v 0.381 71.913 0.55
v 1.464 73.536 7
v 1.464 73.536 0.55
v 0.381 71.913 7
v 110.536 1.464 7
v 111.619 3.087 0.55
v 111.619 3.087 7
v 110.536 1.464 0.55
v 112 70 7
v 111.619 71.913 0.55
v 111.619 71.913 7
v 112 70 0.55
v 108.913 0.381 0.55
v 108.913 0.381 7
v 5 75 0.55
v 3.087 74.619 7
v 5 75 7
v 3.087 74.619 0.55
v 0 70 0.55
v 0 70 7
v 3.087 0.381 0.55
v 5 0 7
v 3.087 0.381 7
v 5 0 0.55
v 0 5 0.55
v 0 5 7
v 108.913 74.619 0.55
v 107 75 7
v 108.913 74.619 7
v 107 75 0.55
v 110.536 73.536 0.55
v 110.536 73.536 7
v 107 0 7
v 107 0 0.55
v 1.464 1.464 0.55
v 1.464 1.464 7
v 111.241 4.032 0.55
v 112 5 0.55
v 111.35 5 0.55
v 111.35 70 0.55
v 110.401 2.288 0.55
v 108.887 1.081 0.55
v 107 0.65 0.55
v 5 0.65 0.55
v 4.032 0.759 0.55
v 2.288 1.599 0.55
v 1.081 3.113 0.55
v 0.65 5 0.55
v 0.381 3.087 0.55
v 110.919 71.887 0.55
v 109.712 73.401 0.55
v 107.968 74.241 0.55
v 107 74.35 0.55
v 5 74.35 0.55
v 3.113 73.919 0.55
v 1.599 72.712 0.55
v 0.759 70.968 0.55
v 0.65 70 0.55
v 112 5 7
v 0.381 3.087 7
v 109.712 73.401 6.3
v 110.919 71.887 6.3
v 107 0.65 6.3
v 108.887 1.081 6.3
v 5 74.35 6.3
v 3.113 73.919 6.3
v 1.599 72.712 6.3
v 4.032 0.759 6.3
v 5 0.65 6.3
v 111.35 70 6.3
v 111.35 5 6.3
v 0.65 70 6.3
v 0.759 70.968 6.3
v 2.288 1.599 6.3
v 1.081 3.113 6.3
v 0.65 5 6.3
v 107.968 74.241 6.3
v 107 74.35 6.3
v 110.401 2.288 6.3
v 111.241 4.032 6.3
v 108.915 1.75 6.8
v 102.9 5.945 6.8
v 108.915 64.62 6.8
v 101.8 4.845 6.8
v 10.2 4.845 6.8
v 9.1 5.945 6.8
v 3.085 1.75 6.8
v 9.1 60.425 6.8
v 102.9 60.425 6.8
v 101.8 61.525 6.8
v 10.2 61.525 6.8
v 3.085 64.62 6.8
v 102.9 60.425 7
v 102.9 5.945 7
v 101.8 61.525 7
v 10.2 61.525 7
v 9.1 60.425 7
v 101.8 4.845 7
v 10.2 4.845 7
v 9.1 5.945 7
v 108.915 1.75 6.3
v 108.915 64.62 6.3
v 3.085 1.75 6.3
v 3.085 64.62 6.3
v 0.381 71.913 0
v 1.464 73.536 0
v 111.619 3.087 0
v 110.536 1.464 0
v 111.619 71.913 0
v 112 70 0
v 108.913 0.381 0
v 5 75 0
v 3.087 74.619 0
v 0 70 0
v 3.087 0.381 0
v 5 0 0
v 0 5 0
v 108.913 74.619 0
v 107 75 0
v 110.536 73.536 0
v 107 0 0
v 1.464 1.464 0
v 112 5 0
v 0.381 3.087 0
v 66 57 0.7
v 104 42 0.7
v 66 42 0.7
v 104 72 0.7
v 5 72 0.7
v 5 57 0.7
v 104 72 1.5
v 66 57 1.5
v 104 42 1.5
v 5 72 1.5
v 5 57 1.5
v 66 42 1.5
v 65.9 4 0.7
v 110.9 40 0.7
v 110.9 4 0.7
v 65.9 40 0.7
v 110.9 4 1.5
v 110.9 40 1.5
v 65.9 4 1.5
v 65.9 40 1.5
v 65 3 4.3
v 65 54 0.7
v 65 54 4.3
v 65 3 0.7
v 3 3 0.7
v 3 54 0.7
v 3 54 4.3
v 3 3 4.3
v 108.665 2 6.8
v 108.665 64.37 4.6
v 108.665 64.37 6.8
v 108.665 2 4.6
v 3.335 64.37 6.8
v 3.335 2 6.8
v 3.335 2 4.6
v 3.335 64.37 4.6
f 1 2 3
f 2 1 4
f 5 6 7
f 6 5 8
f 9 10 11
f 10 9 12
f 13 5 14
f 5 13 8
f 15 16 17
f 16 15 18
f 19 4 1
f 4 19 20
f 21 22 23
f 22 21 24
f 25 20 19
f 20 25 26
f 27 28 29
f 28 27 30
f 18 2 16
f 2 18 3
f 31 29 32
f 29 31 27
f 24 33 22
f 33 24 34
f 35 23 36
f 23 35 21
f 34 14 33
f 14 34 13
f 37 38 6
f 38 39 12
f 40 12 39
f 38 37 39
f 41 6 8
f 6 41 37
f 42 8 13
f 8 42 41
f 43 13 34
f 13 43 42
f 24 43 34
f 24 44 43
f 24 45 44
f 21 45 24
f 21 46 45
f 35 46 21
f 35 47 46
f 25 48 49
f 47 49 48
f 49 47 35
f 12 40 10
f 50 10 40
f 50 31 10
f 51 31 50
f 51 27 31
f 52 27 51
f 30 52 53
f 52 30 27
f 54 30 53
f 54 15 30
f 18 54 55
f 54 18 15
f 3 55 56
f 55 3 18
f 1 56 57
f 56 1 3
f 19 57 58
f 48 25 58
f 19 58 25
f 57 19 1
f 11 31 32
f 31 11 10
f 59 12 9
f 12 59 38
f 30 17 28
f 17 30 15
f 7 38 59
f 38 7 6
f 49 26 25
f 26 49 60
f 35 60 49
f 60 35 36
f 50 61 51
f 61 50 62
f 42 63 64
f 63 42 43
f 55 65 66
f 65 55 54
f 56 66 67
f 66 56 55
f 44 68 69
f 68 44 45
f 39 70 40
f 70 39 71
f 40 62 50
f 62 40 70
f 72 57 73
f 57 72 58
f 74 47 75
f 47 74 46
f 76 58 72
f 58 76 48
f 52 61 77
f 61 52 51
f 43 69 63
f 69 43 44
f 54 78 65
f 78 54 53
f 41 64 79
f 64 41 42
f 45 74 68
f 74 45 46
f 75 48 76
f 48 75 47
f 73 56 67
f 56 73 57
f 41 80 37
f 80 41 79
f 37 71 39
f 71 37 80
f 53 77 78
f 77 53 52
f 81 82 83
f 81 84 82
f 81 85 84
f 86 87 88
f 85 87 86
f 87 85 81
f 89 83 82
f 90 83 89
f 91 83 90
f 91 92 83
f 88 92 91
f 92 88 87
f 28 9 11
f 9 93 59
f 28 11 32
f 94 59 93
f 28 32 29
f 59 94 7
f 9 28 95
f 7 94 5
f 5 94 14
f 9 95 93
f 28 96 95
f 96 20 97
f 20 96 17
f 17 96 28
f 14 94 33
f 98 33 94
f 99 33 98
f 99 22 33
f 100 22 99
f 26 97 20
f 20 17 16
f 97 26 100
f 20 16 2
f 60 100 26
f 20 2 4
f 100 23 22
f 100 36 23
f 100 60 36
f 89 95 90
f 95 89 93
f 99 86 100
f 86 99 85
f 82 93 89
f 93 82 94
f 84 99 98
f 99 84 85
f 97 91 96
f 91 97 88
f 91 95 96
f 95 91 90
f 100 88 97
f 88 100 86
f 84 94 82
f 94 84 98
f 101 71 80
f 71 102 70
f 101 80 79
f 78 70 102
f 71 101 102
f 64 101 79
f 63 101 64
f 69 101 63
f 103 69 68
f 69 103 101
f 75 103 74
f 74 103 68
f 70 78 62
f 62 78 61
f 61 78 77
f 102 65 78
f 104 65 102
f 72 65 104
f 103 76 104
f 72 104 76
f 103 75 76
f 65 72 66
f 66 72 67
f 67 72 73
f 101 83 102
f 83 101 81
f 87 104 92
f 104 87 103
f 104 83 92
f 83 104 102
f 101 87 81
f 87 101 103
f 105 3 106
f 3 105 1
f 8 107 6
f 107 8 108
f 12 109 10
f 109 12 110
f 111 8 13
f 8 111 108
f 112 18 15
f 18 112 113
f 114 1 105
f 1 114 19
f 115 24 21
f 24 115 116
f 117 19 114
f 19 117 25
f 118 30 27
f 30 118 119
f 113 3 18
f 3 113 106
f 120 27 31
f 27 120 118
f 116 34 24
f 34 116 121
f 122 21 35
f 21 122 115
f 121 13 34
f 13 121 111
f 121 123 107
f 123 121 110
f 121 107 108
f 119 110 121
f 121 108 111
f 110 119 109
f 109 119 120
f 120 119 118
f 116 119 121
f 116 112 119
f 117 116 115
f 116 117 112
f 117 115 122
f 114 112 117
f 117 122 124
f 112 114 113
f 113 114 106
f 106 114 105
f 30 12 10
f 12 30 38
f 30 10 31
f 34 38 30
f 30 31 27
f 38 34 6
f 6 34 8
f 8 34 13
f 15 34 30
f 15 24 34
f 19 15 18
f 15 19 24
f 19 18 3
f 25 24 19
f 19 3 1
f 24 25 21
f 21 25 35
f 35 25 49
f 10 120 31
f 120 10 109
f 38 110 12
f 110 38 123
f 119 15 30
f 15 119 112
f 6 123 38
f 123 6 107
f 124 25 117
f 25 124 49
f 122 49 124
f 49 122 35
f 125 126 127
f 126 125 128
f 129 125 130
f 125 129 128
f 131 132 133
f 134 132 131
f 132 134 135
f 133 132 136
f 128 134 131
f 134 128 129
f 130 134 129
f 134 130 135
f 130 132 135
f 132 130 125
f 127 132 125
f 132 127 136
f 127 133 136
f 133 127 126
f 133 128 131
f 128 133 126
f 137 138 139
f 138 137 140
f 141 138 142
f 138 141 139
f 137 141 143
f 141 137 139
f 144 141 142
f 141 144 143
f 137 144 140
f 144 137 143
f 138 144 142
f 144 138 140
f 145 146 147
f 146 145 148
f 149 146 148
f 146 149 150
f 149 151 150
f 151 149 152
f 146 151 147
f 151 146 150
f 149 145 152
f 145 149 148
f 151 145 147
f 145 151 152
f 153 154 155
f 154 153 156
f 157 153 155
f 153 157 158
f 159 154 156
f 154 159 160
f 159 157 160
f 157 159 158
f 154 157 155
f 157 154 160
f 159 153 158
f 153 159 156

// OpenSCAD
// file: thin7/THIN7-ENCLOSURE-STUDY.scad
// Thin7 MECHANICAL PARTITION; empty PCB outlines, not fabrication inputs.
// Panel/pouch/connector/support tolerances and routing are not qualified.
module slab(r,z,h){translate([r[0],r[1],z])cube([r[2]-r[0],r[3]-r[1],h]);}
module rounded(w,h,r,z){translate([r,r,0])linear_extrude(height=z)offset(r=r)square([w-2*r,h-2*r]);}
color([.1,.12,.14])rounded(112,75,5,.55);
color([.1,.12,.14])translate([0,0,.55])difference(){rounded(112,75,5,5.75);translate([.65,.65,-.01])rounded(110.7,73.7,4.35,5.77);}
color([.1,.12,.14])translate([0,0,6.8])difference(){rounded(112,75,5,.2);translate([10.2,5.945,-.01])linear_extrude(height=.22)offset(r=1.1)square([91.6,54.48]);}
color([.1,.12,.14])translate([0,0,6.3])difference(){rounded(112,75,5,.5);translate([3.085,1.75,-.01])cube([105.83,62.87,.52]);}
color([.05,.4,.22])translate([0,0,0.7])linear_extrude(height=.8)polygon([[5, 57], [66, 57], [66, 42], [104, 42], [104, 72], [5, 72]]); // Core-Thin7 EMPTY TEMPLATE
color([.06,.23,.38])translate([0,0,0.7])linear_extrude(height=.8)polygon([[65.9, 4], [110.9, 4], [110.9, 40], [65.9, 40]]); // Display-Thin7 EMPTY TEMPLATE
color([.65,.66,.63])slab([3, 3, 65, 54],.7,3.1); // complete-pack MAX requirement; not selected SKU
color([1,.6,.1,.20])slab([3, 3, 65, 54],3.8,.5); // swelling space, must remain empty
color([.17,.17,.17,.35])slab([3.335, 2.0, 108.665, 64.37],4.6,2.2); // panel thickness budget
// Border frame covers the inactive panel area ABOVE6.8 only; underside pocket avoids solid overlap.
// Uniform outer thickness7.0mm; no scaled native PCB/module/component bodies.
// main file
// Thin7 requirement supersedes the old21mm study.
include <thin7/THIN7-ENCLOSURE-STUDY.scad>
